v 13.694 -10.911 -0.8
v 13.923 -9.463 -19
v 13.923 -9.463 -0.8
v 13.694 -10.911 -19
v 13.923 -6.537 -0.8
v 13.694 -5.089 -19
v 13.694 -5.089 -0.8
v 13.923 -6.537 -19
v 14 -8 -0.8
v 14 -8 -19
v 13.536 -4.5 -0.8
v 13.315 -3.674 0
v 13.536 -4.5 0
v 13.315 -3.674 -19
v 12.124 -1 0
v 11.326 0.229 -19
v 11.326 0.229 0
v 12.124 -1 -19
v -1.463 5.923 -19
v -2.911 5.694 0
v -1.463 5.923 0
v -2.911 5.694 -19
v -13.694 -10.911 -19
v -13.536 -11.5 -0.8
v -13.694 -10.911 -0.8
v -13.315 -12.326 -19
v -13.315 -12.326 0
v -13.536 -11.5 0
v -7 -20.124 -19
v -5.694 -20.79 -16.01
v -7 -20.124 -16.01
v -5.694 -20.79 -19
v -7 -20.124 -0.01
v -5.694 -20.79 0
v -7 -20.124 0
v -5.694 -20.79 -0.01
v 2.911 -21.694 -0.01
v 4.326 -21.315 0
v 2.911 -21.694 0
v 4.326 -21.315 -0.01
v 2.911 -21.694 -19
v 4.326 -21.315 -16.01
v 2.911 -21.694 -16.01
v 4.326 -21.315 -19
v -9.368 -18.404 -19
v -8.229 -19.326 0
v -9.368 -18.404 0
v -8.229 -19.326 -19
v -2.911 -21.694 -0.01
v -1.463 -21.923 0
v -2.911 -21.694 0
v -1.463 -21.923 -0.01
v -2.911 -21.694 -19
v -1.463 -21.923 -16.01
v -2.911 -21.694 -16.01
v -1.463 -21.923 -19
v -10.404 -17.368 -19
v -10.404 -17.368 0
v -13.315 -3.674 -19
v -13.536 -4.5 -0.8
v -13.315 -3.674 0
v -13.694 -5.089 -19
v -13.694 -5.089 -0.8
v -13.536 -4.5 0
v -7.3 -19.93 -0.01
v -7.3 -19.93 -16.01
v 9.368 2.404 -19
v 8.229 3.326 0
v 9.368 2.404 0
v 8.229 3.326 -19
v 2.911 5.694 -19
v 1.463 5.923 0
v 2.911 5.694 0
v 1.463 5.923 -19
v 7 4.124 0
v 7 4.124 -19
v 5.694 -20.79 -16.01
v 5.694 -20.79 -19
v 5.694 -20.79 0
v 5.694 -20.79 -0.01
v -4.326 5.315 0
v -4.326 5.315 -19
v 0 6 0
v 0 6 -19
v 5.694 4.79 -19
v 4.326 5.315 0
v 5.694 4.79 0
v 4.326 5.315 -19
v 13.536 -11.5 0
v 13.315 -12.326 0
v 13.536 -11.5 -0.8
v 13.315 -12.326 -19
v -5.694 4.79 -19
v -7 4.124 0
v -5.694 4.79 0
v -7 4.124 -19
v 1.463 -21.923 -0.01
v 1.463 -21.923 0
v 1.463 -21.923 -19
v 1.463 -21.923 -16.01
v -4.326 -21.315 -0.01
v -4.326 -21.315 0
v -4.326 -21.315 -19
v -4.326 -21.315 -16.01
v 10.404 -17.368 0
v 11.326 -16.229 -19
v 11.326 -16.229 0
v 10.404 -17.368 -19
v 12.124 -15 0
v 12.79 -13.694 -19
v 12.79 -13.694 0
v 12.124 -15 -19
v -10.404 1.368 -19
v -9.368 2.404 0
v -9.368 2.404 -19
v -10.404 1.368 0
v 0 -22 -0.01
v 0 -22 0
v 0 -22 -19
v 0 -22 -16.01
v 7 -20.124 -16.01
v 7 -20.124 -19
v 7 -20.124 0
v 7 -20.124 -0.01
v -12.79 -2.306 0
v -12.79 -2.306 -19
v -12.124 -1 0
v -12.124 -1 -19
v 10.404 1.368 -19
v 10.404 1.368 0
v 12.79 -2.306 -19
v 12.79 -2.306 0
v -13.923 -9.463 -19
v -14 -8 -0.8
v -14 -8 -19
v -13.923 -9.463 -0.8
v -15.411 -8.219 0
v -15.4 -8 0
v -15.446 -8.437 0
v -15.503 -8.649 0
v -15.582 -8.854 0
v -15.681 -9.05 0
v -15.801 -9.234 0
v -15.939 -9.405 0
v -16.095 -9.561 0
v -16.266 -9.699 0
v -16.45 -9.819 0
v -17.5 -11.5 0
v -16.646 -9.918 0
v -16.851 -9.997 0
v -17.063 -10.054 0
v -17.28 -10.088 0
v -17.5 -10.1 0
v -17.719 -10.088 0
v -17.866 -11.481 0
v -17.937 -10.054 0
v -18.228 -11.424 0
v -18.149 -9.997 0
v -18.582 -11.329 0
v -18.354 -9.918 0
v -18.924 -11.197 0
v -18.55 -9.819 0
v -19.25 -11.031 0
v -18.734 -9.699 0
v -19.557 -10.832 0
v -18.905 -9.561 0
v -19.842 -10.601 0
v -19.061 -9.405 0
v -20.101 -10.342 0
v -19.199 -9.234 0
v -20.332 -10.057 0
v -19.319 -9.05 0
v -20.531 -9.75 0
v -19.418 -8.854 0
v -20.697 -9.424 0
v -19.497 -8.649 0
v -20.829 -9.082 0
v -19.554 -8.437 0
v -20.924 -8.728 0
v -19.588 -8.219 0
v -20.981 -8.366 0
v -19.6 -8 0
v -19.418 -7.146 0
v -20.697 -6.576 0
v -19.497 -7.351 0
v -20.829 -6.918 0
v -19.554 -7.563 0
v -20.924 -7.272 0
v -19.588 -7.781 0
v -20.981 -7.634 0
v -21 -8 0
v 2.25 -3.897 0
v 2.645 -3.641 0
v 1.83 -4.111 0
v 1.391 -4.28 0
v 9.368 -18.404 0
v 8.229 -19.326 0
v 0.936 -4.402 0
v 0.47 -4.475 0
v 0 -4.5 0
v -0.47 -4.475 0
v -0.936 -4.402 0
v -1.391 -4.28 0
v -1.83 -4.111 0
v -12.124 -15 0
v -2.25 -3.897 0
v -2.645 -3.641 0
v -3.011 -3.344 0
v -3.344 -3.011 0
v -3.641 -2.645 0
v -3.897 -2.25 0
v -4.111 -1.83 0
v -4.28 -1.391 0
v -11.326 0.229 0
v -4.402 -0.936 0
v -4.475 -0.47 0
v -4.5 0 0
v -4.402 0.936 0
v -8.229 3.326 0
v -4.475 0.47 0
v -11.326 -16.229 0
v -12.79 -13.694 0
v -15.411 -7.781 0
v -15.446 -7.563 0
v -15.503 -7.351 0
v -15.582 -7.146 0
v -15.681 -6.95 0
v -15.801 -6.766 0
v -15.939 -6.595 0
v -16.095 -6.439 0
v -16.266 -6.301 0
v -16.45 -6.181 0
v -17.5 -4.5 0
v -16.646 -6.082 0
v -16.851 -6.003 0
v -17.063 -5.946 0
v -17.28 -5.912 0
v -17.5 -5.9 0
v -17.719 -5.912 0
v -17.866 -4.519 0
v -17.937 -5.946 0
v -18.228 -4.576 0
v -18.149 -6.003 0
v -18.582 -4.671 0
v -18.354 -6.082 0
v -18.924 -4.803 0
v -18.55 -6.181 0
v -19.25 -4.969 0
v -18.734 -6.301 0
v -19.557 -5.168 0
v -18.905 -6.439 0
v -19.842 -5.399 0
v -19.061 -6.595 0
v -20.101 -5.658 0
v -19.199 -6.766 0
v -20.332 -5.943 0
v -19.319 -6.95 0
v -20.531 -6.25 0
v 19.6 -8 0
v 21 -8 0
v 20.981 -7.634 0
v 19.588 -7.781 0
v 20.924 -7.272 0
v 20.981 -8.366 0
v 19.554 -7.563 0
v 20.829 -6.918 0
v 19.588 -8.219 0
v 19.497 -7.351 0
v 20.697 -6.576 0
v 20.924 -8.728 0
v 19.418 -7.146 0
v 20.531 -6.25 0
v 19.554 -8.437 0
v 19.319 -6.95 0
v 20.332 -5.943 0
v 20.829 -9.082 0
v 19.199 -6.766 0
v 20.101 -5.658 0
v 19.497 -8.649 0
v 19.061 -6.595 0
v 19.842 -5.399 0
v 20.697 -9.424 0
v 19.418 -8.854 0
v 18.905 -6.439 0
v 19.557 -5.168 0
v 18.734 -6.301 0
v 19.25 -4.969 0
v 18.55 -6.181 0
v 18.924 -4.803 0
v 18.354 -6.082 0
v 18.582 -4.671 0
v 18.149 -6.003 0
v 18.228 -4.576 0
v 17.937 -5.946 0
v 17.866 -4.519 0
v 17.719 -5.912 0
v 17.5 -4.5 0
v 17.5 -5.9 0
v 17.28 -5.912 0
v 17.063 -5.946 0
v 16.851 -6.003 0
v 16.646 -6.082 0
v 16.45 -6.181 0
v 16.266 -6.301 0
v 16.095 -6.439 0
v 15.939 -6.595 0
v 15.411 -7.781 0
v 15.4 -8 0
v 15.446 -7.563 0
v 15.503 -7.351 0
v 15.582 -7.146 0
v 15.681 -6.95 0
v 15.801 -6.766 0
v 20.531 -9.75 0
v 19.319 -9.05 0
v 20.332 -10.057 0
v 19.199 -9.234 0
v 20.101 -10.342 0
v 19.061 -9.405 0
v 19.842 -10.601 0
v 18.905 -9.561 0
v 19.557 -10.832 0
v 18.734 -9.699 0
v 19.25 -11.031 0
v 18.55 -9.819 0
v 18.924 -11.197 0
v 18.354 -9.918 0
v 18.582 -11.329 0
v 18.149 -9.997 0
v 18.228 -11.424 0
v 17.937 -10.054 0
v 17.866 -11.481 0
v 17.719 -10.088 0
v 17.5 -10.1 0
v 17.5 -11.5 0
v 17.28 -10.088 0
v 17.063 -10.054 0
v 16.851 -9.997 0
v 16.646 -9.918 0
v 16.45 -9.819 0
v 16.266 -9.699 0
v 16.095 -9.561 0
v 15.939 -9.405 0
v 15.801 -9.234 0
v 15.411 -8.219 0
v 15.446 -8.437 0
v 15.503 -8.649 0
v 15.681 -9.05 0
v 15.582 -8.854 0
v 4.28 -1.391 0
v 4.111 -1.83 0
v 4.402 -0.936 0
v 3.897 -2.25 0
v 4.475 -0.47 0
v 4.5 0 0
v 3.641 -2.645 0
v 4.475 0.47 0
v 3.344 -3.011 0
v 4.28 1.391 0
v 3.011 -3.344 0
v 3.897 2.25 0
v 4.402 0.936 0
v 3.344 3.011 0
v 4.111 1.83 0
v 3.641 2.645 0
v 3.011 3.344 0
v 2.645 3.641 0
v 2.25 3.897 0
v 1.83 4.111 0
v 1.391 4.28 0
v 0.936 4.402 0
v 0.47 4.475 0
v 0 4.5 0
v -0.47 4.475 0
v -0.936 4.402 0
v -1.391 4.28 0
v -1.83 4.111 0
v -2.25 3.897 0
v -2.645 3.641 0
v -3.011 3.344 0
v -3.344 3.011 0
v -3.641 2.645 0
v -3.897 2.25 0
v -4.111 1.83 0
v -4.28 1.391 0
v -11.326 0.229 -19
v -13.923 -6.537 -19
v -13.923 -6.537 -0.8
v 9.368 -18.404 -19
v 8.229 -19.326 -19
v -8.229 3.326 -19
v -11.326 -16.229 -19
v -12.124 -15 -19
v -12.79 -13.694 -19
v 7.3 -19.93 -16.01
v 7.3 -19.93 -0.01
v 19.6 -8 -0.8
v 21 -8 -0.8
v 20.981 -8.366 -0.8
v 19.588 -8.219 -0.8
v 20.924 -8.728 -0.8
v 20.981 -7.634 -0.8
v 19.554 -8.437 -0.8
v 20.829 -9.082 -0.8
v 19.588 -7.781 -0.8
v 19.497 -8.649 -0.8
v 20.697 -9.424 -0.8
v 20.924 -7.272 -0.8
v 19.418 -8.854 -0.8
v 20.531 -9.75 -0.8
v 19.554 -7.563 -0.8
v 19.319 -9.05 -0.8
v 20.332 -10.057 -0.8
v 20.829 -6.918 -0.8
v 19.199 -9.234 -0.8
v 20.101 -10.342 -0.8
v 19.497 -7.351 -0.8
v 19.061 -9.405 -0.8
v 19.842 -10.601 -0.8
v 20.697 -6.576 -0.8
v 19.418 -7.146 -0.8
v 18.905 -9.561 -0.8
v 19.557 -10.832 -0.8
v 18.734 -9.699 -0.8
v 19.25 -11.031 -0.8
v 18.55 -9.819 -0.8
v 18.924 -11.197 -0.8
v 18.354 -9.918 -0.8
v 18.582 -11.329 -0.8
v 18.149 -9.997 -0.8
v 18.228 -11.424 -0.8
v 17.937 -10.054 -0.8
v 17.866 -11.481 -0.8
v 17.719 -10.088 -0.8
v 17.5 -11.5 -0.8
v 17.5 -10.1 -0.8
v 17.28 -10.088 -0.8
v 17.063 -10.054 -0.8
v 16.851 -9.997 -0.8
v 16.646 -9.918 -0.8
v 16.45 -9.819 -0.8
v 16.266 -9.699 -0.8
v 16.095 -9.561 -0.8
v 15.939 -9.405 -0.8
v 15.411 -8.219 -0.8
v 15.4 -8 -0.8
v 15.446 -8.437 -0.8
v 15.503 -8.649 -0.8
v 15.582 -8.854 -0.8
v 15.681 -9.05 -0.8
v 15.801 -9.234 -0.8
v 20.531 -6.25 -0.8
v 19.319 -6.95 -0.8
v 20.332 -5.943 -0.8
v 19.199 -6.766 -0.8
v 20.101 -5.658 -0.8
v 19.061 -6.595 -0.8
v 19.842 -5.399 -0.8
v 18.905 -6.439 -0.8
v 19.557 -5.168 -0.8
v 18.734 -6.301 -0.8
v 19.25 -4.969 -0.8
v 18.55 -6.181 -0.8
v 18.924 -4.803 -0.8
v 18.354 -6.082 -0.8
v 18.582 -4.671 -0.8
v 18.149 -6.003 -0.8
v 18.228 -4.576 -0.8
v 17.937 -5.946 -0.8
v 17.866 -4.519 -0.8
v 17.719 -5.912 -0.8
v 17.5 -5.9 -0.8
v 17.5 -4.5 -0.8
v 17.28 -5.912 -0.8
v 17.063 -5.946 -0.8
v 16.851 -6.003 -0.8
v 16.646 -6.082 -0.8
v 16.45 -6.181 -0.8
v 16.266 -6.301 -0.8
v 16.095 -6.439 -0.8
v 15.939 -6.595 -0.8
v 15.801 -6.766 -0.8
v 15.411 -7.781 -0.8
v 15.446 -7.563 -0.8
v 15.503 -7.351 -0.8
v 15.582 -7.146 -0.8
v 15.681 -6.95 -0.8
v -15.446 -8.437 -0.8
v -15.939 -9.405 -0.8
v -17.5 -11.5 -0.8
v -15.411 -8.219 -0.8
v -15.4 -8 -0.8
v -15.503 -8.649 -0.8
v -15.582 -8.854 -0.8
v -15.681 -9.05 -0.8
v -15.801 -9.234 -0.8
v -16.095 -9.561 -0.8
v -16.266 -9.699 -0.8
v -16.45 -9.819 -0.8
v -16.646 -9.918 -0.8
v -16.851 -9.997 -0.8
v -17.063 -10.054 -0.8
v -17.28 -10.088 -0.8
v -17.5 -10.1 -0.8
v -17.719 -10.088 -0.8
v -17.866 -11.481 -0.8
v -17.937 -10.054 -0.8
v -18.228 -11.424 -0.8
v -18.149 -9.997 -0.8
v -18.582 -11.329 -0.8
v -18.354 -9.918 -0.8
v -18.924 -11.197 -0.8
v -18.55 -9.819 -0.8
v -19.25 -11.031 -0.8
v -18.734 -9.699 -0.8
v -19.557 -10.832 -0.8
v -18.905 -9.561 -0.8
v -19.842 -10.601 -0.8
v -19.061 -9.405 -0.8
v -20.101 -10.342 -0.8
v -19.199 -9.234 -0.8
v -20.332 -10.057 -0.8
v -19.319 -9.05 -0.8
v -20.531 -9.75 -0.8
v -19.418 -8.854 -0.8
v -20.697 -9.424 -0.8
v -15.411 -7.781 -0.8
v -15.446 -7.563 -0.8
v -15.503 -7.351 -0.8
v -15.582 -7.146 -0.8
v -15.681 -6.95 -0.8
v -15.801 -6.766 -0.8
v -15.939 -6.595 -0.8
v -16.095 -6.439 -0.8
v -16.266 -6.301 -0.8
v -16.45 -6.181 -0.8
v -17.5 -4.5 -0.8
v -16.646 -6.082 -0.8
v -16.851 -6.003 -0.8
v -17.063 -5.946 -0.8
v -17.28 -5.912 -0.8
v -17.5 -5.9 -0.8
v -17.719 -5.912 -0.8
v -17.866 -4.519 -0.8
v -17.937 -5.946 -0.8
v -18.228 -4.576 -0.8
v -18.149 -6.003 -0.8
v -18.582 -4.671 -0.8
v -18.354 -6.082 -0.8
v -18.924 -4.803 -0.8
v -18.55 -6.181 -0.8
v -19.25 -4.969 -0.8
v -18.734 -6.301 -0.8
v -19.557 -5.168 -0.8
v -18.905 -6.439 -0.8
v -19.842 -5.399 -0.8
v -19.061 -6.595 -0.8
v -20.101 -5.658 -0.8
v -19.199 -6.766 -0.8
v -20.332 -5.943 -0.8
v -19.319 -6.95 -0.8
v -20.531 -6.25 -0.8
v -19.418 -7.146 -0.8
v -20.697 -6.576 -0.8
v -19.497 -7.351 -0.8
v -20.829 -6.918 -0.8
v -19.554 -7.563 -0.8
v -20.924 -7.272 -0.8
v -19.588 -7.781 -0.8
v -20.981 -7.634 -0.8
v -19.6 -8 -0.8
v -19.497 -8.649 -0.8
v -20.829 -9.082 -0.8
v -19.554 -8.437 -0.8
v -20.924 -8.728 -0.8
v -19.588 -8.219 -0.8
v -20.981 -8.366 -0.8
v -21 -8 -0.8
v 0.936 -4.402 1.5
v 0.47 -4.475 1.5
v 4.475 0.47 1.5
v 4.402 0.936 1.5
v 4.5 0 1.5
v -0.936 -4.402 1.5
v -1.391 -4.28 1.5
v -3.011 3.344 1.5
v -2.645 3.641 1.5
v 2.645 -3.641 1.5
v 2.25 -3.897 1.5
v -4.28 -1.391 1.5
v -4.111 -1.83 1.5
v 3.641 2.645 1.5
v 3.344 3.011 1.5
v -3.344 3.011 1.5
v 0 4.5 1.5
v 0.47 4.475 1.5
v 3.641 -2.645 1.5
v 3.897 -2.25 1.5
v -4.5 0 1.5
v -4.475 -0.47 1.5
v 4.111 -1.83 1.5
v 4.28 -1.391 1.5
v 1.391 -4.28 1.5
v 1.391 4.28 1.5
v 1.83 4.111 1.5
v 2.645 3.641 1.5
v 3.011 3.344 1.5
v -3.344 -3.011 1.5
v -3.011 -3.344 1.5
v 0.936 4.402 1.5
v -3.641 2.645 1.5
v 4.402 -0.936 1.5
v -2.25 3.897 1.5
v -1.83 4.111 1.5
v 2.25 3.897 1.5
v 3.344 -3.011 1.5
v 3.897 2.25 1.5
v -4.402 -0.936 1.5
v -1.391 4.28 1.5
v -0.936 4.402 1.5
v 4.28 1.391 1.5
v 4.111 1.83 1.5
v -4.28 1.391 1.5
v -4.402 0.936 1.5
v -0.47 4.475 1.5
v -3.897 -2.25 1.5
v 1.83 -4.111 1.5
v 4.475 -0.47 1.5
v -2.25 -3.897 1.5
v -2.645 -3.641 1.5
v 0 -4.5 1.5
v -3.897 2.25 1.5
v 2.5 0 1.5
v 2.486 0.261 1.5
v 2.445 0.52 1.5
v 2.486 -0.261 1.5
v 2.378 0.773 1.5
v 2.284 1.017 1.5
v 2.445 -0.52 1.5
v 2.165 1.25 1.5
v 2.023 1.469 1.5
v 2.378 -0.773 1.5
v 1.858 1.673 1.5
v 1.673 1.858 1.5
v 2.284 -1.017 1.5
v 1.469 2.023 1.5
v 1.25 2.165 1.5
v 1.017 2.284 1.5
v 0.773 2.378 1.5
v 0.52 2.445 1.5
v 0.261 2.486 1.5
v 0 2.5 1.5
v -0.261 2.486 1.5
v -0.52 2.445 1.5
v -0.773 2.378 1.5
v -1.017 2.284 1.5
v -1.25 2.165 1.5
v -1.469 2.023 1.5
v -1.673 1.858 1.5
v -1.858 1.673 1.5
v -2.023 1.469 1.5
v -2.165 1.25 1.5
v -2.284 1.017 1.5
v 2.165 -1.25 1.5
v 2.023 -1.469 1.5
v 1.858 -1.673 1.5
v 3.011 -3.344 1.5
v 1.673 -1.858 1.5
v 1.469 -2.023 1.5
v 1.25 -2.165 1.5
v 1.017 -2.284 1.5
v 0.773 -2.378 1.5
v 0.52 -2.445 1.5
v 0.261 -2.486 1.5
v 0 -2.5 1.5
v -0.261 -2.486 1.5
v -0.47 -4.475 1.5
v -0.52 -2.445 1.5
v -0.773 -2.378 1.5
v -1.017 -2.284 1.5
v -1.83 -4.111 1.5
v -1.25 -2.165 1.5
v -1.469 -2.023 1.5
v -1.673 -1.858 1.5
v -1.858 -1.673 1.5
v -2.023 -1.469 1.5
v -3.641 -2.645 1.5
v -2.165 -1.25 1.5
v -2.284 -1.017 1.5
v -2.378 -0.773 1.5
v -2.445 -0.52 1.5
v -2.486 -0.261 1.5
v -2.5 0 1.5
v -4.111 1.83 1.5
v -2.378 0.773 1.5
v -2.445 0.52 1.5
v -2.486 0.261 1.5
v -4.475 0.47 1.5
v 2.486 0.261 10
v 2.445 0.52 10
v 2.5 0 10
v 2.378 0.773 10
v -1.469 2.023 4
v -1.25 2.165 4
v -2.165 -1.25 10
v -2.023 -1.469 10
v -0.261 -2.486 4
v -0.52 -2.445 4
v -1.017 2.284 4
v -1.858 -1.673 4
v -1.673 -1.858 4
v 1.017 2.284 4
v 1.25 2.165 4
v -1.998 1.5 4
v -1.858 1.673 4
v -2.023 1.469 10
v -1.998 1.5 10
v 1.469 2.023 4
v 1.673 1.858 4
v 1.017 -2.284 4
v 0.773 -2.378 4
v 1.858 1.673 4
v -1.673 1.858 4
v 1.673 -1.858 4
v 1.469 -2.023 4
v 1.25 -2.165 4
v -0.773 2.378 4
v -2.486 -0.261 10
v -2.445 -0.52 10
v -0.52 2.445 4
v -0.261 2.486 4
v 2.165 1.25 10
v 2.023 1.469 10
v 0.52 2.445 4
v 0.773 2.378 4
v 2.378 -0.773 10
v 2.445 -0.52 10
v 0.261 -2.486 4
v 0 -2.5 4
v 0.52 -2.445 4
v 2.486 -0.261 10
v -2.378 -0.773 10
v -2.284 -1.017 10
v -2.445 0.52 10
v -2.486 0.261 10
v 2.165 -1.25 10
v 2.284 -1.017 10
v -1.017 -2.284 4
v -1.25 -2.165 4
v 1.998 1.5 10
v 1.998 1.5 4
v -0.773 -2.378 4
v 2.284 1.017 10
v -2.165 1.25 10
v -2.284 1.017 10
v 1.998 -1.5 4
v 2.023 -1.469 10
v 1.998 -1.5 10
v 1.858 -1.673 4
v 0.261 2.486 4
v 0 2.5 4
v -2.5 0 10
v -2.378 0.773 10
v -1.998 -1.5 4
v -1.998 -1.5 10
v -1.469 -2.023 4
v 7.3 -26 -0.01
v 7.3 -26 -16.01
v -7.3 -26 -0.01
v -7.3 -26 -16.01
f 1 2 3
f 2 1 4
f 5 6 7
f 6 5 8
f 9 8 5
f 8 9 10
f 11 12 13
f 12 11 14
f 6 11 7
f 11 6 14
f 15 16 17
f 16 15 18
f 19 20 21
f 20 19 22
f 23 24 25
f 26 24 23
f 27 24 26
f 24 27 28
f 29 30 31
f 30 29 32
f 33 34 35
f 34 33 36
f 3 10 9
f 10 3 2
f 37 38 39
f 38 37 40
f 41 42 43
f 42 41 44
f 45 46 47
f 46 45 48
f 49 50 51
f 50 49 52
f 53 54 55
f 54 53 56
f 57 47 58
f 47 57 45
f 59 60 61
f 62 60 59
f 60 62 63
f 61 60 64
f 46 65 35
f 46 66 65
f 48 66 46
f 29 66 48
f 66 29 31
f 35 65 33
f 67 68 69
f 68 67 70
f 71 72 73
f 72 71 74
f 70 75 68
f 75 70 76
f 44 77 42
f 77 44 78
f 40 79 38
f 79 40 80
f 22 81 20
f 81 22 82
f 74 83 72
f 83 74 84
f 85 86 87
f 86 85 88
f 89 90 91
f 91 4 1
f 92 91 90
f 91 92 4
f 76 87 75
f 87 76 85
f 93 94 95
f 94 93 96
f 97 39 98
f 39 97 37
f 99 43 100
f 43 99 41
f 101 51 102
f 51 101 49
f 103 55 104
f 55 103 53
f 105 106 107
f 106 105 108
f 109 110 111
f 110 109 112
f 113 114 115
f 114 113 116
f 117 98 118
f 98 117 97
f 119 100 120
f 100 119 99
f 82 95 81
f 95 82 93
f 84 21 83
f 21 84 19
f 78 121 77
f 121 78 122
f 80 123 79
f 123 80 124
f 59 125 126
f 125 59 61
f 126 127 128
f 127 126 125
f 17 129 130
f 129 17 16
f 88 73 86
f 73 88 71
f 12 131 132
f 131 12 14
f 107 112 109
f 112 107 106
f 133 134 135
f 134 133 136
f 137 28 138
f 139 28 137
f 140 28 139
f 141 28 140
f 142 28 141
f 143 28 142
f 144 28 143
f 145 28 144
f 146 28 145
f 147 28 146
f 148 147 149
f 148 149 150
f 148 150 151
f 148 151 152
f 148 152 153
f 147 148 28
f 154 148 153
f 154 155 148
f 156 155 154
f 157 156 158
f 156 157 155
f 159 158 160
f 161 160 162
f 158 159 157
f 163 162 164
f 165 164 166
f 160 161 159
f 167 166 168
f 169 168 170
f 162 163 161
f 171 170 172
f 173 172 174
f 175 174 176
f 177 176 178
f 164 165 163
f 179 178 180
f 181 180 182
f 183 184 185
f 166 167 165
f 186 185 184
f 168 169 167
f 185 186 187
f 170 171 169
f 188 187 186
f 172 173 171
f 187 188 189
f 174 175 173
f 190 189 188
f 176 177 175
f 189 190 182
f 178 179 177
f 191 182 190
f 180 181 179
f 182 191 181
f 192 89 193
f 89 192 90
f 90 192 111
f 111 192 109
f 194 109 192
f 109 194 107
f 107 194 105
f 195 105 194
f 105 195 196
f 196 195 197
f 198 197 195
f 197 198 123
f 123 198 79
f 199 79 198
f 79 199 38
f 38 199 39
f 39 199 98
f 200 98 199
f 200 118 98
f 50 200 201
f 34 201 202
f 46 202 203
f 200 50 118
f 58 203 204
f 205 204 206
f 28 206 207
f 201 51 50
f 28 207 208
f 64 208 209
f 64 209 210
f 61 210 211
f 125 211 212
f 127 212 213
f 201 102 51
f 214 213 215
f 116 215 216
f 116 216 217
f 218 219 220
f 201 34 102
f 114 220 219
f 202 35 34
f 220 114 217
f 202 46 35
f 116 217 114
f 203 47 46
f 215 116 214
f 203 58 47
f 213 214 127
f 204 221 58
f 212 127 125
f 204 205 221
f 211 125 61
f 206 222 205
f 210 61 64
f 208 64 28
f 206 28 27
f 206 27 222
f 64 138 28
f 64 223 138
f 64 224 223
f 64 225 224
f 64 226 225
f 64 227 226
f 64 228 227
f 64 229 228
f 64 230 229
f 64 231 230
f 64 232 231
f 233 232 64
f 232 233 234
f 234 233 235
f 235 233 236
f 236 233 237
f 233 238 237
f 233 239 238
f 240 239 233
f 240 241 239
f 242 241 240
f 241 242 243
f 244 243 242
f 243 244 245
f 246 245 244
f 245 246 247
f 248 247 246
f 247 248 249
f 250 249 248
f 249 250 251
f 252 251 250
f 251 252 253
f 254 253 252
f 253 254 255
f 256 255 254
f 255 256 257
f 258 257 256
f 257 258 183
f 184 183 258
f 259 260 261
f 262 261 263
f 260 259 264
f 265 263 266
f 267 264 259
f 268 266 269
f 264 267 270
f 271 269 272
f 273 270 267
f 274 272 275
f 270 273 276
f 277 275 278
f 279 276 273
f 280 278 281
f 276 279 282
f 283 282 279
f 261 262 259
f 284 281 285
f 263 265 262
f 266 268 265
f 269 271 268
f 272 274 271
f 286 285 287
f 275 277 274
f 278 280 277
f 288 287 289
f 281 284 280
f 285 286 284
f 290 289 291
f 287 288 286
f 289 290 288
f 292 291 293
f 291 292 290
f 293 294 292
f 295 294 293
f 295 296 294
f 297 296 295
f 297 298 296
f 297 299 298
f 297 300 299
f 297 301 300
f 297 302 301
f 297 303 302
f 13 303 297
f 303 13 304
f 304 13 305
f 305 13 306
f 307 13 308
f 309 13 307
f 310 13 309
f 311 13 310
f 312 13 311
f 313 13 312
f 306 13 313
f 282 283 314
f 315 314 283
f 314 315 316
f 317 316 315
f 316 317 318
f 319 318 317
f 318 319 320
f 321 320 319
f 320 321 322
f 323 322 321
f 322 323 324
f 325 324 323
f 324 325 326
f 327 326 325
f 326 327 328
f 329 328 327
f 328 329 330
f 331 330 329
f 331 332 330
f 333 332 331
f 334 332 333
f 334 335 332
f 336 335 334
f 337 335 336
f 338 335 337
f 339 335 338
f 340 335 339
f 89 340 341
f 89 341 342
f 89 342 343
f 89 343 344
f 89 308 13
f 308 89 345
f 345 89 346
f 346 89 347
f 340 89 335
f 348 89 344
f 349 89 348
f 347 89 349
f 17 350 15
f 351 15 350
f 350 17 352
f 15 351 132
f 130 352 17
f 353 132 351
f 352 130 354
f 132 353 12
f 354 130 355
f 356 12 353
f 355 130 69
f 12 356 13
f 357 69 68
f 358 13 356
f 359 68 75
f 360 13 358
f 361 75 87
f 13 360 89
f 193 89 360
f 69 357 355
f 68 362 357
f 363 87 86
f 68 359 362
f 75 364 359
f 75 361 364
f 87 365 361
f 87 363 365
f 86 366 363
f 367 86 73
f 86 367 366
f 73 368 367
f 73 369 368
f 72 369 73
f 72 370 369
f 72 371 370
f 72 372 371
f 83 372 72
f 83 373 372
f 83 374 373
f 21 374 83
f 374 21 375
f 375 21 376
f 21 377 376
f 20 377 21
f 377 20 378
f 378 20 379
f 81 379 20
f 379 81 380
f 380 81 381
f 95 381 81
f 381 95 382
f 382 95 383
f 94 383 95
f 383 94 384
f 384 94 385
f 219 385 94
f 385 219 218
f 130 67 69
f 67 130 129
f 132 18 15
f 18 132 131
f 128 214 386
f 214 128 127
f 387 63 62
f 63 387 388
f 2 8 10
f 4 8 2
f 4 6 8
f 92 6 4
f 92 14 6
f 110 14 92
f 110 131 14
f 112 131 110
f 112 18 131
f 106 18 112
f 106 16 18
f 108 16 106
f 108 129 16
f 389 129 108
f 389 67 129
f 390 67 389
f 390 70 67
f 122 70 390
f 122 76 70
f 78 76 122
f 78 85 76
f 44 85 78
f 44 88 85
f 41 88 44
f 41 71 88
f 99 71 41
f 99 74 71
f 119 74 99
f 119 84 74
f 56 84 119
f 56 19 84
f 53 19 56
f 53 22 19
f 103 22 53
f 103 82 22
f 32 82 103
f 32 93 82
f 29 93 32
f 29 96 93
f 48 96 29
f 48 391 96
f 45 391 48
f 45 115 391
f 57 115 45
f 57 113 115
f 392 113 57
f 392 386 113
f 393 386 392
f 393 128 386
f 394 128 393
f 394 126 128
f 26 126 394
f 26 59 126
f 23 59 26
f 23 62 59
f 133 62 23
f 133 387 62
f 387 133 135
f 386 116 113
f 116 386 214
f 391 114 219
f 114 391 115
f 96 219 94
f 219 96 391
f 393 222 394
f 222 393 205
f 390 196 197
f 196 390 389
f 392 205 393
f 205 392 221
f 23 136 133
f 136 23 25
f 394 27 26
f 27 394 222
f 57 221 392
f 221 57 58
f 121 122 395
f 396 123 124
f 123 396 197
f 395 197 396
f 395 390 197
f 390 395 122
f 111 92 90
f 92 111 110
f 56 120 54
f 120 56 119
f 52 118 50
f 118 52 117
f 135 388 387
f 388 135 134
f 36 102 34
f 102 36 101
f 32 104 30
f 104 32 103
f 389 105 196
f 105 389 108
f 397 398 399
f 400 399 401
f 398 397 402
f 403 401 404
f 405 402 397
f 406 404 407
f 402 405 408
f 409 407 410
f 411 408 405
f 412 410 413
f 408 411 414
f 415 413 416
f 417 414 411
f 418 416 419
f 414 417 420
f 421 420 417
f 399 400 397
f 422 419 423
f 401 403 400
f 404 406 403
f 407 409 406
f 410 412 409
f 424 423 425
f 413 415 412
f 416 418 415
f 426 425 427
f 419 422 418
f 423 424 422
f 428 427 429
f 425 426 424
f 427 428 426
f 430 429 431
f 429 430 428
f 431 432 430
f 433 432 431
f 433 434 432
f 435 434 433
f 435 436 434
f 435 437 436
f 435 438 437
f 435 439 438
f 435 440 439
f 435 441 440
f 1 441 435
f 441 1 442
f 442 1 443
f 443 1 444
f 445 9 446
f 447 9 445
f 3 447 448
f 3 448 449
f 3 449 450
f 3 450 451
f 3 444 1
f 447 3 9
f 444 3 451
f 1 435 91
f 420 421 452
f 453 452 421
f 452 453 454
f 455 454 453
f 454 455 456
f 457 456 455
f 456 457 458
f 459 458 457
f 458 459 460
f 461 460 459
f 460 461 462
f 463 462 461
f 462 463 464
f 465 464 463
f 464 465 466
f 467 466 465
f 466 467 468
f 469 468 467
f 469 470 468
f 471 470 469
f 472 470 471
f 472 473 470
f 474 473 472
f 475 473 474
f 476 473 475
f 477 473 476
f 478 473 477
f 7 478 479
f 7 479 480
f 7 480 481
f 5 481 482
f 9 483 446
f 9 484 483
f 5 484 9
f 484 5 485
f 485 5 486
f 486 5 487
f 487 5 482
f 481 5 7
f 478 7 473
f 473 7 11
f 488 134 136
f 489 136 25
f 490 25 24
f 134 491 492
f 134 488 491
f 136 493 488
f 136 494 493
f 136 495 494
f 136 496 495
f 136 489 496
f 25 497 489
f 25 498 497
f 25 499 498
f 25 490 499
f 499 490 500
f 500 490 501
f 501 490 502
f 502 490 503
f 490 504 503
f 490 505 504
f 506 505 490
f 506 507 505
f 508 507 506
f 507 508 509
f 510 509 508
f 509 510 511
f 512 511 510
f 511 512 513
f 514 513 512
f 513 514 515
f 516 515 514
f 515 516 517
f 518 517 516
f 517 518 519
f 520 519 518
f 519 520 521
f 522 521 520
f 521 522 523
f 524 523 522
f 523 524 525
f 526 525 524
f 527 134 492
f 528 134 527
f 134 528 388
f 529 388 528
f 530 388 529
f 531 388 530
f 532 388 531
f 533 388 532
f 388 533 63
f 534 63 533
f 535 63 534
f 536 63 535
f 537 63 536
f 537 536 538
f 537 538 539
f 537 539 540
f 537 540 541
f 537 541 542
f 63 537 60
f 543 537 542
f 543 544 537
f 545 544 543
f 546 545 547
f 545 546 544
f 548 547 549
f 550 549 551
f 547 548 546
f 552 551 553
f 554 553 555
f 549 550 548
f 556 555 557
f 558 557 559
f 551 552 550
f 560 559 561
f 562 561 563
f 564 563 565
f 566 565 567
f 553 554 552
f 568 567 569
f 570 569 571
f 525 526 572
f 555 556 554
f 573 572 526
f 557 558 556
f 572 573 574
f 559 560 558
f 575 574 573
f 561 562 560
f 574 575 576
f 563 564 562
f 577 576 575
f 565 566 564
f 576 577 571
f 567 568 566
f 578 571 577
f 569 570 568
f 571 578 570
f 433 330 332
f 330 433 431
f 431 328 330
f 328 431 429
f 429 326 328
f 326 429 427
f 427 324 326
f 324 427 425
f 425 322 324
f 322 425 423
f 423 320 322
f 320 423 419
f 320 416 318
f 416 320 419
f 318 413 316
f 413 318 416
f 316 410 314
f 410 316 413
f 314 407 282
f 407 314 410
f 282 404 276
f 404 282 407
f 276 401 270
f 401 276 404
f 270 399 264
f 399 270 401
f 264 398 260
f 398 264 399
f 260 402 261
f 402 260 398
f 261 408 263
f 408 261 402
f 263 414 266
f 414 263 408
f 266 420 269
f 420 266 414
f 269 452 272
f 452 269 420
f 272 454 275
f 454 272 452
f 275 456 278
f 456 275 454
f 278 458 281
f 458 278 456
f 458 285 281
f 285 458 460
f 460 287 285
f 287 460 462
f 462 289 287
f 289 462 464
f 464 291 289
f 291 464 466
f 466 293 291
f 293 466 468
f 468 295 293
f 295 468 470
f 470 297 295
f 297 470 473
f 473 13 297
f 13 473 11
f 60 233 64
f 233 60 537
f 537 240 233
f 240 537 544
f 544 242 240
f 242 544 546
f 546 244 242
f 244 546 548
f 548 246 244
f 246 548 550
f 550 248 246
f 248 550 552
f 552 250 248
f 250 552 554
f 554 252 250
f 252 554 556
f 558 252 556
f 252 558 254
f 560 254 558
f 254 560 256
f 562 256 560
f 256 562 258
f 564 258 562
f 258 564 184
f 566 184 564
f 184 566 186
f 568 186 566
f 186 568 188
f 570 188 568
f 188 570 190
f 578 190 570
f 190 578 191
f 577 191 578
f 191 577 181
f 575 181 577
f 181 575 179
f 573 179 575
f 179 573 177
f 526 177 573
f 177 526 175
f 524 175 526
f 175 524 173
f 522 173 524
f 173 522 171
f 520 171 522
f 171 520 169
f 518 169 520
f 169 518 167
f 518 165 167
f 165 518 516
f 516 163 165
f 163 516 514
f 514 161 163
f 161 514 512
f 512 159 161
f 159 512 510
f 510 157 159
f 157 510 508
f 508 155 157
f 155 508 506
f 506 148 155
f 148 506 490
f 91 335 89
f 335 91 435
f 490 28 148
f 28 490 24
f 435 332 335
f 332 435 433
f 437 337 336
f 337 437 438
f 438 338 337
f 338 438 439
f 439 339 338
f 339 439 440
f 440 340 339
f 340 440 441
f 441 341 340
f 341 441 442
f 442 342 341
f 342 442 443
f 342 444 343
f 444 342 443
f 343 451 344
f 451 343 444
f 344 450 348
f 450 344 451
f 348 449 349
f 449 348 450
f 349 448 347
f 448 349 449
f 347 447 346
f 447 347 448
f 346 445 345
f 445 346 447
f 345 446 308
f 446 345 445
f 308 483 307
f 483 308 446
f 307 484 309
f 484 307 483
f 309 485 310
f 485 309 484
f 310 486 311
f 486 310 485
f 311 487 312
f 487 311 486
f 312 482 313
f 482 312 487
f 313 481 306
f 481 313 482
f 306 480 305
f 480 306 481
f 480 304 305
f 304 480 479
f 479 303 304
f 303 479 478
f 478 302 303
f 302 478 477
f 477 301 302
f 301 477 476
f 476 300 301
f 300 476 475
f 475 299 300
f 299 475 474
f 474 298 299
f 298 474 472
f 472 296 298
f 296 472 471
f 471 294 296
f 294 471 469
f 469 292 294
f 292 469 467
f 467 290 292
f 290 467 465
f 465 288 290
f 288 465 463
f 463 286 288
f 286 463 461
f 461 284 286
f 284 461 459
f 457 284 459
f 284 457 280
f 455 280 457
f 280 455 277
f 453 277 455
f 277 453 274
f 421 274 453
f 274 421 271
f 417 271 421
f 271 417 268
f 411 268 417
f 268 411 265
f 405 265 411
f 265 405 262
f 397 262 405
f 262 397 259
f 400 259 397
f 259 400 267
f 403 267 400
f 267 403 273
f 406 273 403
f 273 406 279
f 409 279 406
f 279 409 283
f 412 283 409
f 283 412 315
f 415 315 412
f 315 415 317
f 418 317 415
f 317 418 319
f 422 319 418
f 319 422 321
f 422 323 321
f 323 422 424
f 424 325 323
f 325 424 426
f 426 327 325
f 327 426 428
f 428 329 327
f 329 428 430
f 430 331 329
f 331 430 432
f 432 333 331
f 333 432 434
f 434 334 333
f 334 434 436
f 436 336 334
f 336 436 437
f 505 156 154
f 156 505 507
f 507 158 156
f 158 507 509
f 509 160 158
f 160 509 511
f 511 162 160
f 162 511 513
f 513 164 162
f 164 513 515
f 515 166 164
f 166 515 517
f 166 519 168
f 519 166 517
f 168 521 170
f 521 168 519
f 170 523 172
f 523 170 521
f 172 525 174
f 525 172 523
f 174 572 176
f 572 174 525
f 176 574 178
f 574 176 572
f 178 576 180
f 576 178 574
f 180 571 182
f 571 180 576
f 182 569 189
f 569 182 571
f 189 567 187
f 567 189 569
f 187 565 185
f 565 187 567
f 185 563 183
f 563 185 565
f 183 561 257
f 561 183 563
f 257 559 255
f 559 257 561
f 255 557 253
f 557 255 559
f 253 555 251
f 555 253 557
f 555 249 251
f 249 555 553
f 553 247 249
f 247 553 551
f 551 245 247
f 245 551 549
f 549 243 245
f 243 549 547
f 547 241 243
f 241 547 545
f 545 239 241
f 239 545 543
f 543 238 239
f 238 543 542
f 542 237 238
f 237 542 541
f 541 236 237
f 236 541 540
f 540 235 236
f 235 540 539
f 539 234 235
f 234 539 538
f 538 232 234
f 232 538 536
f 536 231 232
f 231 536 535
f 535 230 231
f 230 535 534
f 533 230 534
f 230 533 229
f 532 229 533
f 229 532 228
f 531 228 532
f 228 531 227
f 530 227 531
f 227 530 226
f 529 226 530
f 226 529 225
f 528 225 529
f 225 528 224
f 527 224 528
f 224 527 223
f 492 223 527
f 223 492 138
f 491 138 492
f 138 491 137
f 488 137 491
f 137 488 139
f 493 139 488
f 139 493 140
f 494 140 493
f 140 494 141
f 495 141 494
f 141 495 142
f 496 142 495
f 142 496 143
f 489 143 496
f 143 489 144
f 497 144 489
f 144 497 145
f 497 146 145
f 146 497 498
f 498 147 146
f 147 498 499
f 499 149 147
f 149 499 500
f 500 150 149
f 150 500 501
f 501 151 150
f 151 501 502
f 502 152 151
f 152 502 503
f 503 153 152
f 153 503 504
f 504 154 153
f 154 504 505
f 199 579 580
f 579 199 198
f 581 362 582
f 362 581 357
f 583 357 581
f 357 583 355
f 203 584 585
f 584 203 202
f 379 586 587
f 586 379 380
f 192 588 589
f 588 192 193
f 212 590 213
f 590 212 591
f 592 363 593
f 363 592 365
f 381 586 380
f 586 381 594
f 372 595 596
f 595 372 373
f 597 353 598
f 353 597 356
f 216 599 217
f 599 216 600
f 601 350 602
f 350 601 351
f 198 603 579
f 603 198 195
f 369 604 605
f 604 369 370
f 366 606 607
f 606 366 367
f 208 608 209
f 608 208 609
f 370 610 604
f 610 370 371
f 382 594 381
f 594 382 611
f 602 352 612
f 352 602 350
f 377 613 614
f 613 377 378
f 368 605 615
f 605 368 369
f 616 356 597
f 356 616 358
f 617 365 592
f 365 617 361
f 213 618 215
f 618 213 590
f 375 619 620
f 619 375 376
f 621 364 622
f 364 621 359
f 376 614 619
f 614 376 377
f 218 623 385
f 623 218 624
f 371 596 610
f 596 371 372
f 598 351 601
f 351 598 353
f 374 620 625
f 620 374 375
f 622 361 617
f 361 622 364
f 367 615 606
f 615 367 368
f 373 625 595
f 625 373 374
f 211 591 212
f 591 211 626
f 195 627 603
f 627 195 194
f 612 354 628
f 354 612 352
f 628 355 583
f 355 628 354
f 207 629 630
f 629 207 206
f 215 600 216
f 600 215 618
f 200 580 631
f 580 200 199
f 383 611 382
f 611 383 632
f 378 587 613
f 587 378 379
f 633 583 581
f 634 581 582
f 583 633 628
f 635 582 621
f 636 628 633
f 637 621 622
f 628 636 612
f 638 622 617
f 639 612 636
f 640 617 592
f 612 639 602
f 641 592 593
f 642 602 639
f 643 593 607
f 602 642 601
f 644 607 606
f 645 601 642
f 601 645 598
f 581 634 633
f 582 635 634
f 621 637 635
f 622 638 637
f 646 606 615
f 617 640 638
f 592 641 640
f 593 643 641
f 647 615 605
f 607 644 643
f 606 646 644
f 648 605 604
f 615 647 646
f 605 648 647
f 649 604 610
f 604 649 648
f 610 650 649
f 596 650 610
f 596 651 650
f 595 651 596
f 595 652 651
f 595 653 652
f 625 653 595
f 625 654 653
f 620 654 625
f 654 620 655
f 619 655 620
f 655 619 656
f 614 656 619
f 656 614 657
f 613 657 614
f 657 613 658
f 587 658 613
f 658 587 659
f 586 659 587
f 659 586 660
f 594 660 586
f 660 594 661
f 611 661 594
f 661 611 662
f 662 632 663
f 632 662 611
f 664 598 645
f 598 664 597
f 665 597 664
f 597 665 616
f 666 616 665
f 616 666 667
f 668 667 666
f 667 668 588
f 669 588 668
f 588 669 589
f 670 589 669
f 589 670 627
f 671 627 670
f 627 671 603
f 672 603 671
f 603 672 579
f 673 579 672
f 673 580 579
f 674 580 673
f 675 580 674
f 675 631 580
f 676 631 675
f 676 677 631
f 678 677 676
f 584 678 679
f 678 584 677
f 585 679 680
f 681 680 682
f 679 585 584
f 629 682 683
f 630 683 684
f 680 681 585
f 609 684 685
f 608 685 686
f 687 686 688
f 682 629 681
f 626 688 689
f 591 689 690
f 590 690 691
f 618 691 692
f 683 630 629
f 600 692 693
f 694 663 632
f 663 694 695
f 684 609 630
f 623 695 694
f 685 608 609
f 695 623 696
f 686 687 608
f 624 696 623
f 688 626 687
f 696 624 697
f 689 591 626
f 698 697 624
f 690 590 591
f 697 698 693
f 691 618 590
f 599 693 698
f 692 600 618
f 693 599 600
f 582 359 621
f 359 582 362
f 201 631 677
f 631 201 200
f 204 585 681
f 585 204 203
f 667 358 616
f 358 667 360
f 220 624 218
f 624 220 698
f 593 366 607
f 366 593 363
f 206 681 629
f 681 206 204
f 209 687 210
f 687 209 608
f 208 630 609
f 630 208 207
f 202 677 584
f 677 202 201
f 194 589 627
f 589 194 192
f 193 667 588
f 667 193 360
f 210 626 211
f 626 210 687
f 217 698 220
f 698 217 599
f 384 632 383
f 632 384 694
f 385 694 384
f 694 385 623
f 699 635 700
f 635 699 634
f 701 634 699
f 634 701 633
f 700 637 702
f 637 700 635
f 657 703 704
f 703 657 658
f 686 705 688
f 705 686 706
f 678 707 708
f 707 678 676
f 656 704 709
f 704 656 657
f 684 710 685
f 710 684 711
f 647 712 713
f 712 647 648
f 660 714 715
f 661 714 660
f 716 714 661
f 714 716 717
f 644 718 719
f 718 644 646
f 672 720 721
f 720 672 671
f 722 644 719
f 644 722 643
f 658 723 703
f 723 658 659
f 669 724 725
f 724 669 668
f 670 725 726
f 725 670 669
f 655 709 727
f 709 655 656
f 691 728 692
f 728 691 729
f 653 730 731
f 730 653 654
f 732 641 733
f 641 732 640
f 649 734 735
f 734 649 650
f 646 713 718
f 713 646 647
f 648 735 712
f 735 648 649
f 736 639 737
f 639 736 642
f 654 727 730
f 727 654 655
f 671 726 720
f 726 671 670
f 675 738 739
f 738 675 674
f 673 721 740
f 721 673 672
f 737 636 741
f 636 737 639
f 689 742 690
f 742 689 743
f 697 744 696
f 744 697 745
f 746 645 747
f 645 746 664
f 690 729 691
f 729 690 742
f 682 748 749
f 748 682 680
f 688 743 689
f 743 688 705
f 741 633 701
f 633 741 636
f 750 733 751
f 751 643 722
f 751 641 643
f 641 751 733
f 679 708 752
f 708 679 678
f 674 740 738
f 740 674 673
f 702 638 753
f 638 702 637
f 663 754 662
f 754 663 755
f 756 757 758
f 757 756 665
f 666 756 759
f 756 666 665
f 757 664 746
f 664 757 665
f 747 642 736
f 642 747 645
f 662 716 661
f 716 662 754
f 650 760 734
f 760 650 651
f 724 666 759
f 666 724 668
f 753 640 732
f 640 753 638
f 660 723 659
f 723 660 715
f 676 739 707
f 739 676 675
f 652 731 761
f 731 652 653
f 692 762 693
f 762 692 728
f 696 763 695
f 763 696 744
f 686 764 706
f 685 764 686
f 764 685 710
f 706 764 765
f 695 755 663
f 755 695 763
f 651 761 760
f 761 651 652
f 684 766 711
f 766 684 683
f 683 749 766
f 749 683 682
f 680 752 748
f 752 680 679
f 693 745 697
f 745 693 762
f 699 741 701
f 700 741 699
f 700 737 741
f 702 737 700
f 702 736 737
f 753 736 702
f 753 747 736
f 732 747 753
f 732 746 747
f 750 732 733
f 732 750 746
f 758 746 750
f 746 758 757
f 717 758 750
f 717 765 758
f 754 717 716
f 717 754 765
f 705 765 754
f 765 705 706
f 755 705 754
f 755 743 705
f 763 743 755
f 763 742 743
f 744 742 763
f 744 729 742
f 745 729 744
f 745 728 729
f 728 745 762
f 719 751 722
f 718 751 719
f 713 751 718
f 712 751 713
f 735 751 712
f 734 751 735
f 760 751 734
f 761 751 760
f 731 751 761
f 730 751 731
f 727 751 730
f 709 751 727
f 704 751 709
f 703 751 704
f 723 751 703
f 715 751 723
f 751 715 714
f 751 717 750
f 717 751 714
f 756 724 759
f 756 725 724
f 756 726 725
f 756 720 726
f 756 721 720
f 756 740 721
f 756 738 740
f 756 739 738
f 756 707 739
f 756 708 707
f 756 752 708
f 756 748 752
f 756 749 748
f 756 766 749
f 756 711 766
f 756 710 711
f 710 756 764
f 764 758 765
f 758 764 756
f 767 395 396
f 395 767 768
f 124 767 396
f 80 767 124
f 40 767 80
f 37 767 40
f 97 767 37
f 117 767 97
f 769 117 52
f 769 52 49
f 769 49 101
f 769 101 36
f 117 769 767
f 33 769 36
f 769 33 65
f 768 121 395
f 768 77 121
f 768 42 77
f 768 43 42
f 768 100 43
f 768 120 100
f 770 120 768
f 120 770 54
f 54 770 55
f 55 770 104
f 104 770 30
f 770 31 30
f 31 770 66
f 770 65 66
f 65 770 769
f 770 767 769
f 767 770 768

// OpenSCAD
// file: ../28byj-48.scad
/*
   Copyright 2015 Scott Bezek

   Licensed under the Apache License, Version 2.0 (the "License");
   you may not use this file except in compliance with the License.
   You may obtain a copy of the License at

       http://www.apache.org/licenses/LICENSE-2.0

   Unless required by applicable law or agreed to in writing, software
   distributed under the License is distributed on an "AS IS" BASIS,
   WITHOUT WARRANTIES OR CONDITIONS OF ANY KIND, either express or implied.
   See the License for the specific language governing permissions and
   limitations under the License.
*/

// Basic 28BYJ-48 model based on various dimensioned drawings.
// Origin is centered on the shaft, on the front face of the motor, with the shaft in the +z direction
module Stepper28BYJ48() {
    $fn = 60;

    eps = 0.01;
    chassis_radius = 28/2;
    chassis_height = 19;
    shaft_offset = 8;
    mount_outer_radius = 3.5;
    mount_hole_radius = 4.2/2;
    mount_center_offset = 35/2;
    mount_bracket_height = 0.8;

    shaft_collar_radius = 9/2;
    shaft_collar_height = 1.5;

    shaft_radius = 5/2;
    shaft_height = 10;
    shaft_slotted_width = 3;
    shaft_slotted_height = 6;

    backpack_width = 14.6;
    backpack_extent = 18; // seen values from 17-18
    backpack_height = 16;

    gray = [0.7, 0.7, 0.7];
    gold = "gold";
    blue = "blue";

    module mounting_holes() {
        linear_extrude(height=mount_bracket_height) {
        difference() {
            hull() {
                translate([mount_center_offset, 0]) {
                    circle(r=mount_outer_radius);
                }
                translate([-mount_center_offset, 0]) {
                    circle(r=mount_outer_radius);
                }
            }

            translate([mount_center_offset, 0]) {
                circle(r=mount_hole_radius);
            }
            translate([-mount_center_offset, 0]) {
                circle(r=mount_hole_radius);
            }
        }
        }
    }

    module shaft_collar() {
        cylinder(r=shaft_collar_radius, h=shaft_collar_height + eps);
    }

    module shaft() {
        color(gold) {
            difference() {
                cylinder(r=shaft_radius, h=shaft_height);
                translate([-(shaft_radius + eps), shaft_slotted_width / 2, shaft_height - shaft_slotted_height]) {
                    cube([(shaft_radius+eps)*2, shaft_radius, shaft_slotted_height+eps]);
                }
                translate([-(shaft_radius + eps), - shaft_radius - (shaft_slotted_width / 2), shaft_height - shaft_slotted_height]) {
                    cube([(shaft_radius+eps)*2, shaft_radius, shaft_slotted_height+eps]);
                }
            }
        }
    }

    module chassis() {
        color(gray) {
            translate([0, 0, -chassis_height]) {
                cylinder(r=chassis_radius, h=chassis_height);
            }
            translate([0, 0, -mount_bracket_height]) {
                mounting_holes();
            }
            translate([0, shaft_offset, -eps]) {
                shaft_collar();
            }
        }
    }

    module backpack() {
        color(blue) {
            translate([-backpack_width/2, 0, -backpack_height - eps]) {
                cube([backpack_width, backpack_extent, backpack_height]);
            }
        }
    }

    translate([0, -shaft_offset, 0]) {
        chassis();
        translate([0, shaft_offset, 0]) {
            shaft();
        }
        translate([0, -backpack_extent, 0]) {
            backpack();
        }
    }
}

Stepper28BYJ48();
// file: ../m4_dimensions.scad
/*
   Copyright 2015-2018 Scott Bezek and the splitflap contributors

   Licensed under the Apache License, Version 2.0 (the "License");
   you may not use this file except in compliance with the License.
   You may obtain a copy of the License at

       http://www.apache.org/licenses/LICENSE-2.0

   Unless required by applicable law or agreed to in writing, software
   distributed under the License is distributed on an "AS IS" BASIS,
   WITHOUT WARRANTIES OR CONDITIONS OF ANY KIND, either express or implied.
   See the License for the specific language governing permissions and
   limitations under the License.
*/
// file: ../common.scad
// MDF, .120in nominal
// https://www.ponoko.com/materials/mdf-fiberboard
thickness = 3.0;

etch_depth = 0.1;  // for render
eps=.01;
num_flaps = 40;

// Rendering Colors
assembly_color = [0.76, 0.60, 0.42];  // MDF, "c1996b"
etch_color = [0, 0, 0];  // black, "000000"


assembly_color1 = color_multiply(assembly_color, [1.161, 1.157, 1.157, 1.0]);  // "e1b17c" with MDF
assembly_color2 = color_multiply(assembly_color, [0.897, 0.895, 0.895, 1.0]);  // "ae8960" with MDF
assembly_color3 = color_multiply(assembly_color, [0.547, 0.542, 0.540, 1.0]);  // "6a533a" with MDF
assembly_color4 = color_multiply(assembly_color, [0.268, 0.268, 0.271, 1.0]);  // "34291d" with MDF

// multiply two equal matricies by each element, limiting to a max of 1.0
function color_multiply(x, y) =
    [ for(j=[0:len(x) - 1]) min(x[j] * y[j], 1.0) ];

// inverts a color matrix by subtracting the input channel values from 1.0
function color_invert(x) =
    [ for(j=[0:len(x) - 1]) (1.0 - x[j]) ];

module enclosure_etch_style() {
    color(etch_color)
        translate([0, 0, thickness])
            linear_extrude(height=etch_depth)
                children();
}
// file: motor.scad
/*
   Copyright 2015-2016 Scott Bezek and the splitflap contributors

   Licensed under the Apache License, Version 2.0 (the "License");
   you may not use this file except in compliance with the License.
   You may obtain a copy of the License at

       http://www.apache.org/licenses/LICENSE-2.0

   Unless required by applicable law or agreed to in writing, software
   distributed under the License is distributed on an "AS IS" BASIS,
   WITHOUT WARRANTIES OR CONDITIONS OF ANY KIND, either express or implied.
   See the License for the specific language governing permissions and
   limitations under the License.
*/

include<../28byj-48.scad>;

motor_shaft_under_radius = 0.08;  // interference fit
motor_slop_radius = 3;

// holes for 28byj-48 motor, centered around motor shaft
module motor_mount() {
    circle(r=28byj48_shaft_radius+motor_slop_radius, $fn=30);
    translate([-28byj48_mount_center_offset, -8]) {
        circle(r=motor_mount_hole_radius, $fn=30);
    }
    translate([28byj48_mount_center_offset, -8]) {
        circle(r=motor_mount_hole_radius, $fn=30);
    }

    hull() {
        x = -28byj48_chassis_radius - motor_hole_slop/2 + motor_window_radius;
        y = [-28byj48_shaft_offset - motor_backpack_extent - motor_hole_slop/2 + motor_window_radius,
            -28byj48_shaft_offset + 28byj48_chassis_radius + motor_hole_slop/2 - motor_window_radius];

        translate([ x, y[0], 0]) circle(r=motor_window_radius, $fn=40);
        translate([-x, y[1], 0]) circle(r=motor_window_radius, $fn=40);
        translate([-x, y[0], 0]) circle(r=motor_window_radius, $fn=40);
        translate([ x, y[1], 0]) circle(r=motor_window_radius, $fn=40);
    }
}

// double-flatted motor shaft of 28byj-48 motor (2D)
module motor_shaft() {
    union() {
        intersection() {
            circle(r=28byj48_shaft_radius-motor_shaft_under_radius, $fn=50);
            square([28byj48_shaft_radius*2, 3], center=true);
        }
        square([28byj48_shaft_radius/3, 28byj48_shaft_radius*4], center=true);
    }
}
// file: flap.scad
/*
   Copyright 2018 Scott Bezek and the splitflap contributors

   Licensed under the Apache License, Version 2.0 (the "License");
   you may not use this file except in compliance with the License.
   You may obtain a copy of the License at

       http://www.apache.org/licenses/LICENSE-2.0

   Unless required by applicable law or agreed to in writing, software
   distributed under the License is distributed on an "AS IS" BASIS,
   WITHOUT WARRANTIES OR CONDITIONS OF ANY KIND, either express or implied.
   See the License for the specific language governing permissions and
   limitations under the License.
*/

flap_width = 54;
flap_height = 43;
flap_thickness = 30 / 1000 * 25.4; // 30 mil
flap_corner_radius = 3.1; // 2.88-3.48mm (used just for display)
flap_width_slop = 0.5;  // amount of slop of the flap side to side between the 2 spools

flap_notch_height_auto = false;
flap_notch_height_default = 15;
flap_notch_depth = 3.2;

flap_notch_height = (flap_notch_height_auto == true) ? sqrt(spool_outer_radius*spool_outer_radius - flap_pitch_radius*flap_pitch_radius) : flap_notch_height_default;

flap_pin_width = 1.4;
flap_color = [1, 1, 1];  // white, "ffffff"

eps=.01;

flap_hole_radius = (flap_pin_width + 1) / 2;
flap_hole_separation = 1;  // additional spacing between hole edges
flap_gap = (flap_hole_radius * 2 - flap_pin_width) + flap_hole_separation;

// flap();

module flap_2d(cut_tabs = true) {
    translate([0, -flap_pin_width/2, 0])
    difference() {
        union() {
            square([flap_width, flap_height - flap_corner_radius]);

            // rounded corners
            hull() {
                translate([flap_corner_radius, flap_height - flap_corner_radius])
                    circle(r=flap_corner_radius, $fn=40);
                translate([flap_width - flap_corner_radius, flap_height - flap_corner_radius])
                    circle(r=flap_corner_radius, $fn=40);
            }
        }
        // spool tabs
        if(cut_tabs) {
            translate([-eps, flap_pin_width])
                square([eps + flap_notch_depth, flap_notch_height]);
            translate([flap_width - flap_notch_depth, flap_pin_width])
                square([eps + flap_notch_depth, flap_notch_height]);
        }
    }
}

module flap() {
    color(flap_color)
    translate([0, 0, -flap_thickness/2])
    linear_extrude(height=flap_thickness) {
        flap_2d();
    }
}

module draw_letter(letter) {
    translate([0, -flap_height * letter_height, 0])  // valign compensation
        scale([letter_width, 1, 1])
            translate([letter_offset_x, letter_offset_y])
                text(text=letter, size=flap_height * letter_height * 2, font=letter_font, halign="center");
}

module flap_letter(letter, half = 0) {
    color(letter_color)
    translate([0, 0, flap_thickness/2 + eps])
    linear_extrude(height=0.1, center=true) {
        if (half != 0) {  // trimming to top (1) or bottom (2)
            intersection() {
                flap_2d();  // limit to bounds of flap
                translate([flap_width/2, -flap_pin_width/2, 0]) {
                    rotation = (half == 2) ? -180 : 0;  // flip upside-down for bottom
                    gap_comp = (letter_gap_comp == true) ? -flap_gap/2 : 0;
                    translate([0, gap_comp, 0])
                        rotate([0,0,rotation])
                            draw_letter(letter);
                }
            }
        } else {
            translate([flap_width/2, -flap_pin_width/2 - flap_gap/2, 0])
                draw_letter(letter);
        }
    }
}
// main file
/*
   Copyright 2015-2016 Scott Bezek and the splitflap contributors

   Licensed under the Apache License, Version 2.0 (the "License");
   you may not use this file except in compliance with the License.
   You may obtain a copy of the License at

       http://www.apache.org/licenses/LICENSE-2.0

   Unless required by applicable law or agreed to in writing, software
   distributed under the License is distributed on an "AS IS" BASIS,
   WITHOUT WARRANTIES OR CONDITIONS OF ANY KIND, either express or implied.
   See the License for the specific language governing permissions and
   limitations under the License.
*/

include<flap.scad>;
include<motor.scad>;
include<../common.scad>;
include<../m4_dimensions.scad>;

thickness = 3.0;

spool_strut_num_joints = 3;
spool_strut_tab_width=8;
spool_strut_tab_width_narrow=6;
spool_strut_tab_outset=8;

spool_width_slop = 1.4;  // amount of slop for the spool assembly side-to-side inside the enclosure
spool_width = flap_width - flap_notch_depth*2 + flap_width_slop + thickness*2;  // spool width, outside face (spool to spool)
spool_width_clearance = max(spool_width, flap_width + flap_width_slop);  // width clearance for the spool, either for the spool itself or the flaps

spool_strut_width = (spool_strut_tab_outset + thickness/2) * 2;
spool_strut_length = spool_width;
spool_strut_inner_length = spool_width - 3 * thickness;


spool_tab_clearance = -0.06;  // for the tabs connecting the struts to the spool ends (interference fit)
spool_retaining_clearance = 0.10;  // for the notches in the spool retaining wall
spool_joint_clearance = 0.10;  // for the notched joints on the spool struts

spool_strut_exclusion_radius = sqrt((spool_strut_tab_outset+thickness/2)*(spool_strut_tab_outset+thickness/2) + (spool_strut_tab_width/2)*(spool_strut_tab_width/2));
flap_pitch_radius = flap_spool_pitch_radius(num_flaps, flap_hole_radius, flap_hole_separation); //num_flaps * (flap_hole_radius*2 + flap_hole_separation) / (2*PI);
echo(spool_strut_exclusion_radius );
echo(flap_pitch_radius );
echo((spool_strut_exclusion_radius + flap_pitch_radius)/2);
magnet_diameter = 4;
magnet_hole_clearance = -0.07;  // interference fit
magnet_hole_radius = (magnet_diameter + magnet_hole_clearance)/2;

magnet_hole_offset = (spool_strut_exclusion_radius + flap_pitch_radius)/2;



spool_explosion = 0; // 0-1
spool_strut_explosion = lookup(spool_explosion, [
    [0, 0],
    [0.2, 0],
    [1, 30],
]);
spool_horizontal_explosion = lookup(spool_explosion, [
    [0, 0],
    [1, 8],
]);
flap_spool_outset = flap_hole_radius;


module spool_strut() {
    joint_tab_width = spool_strut_inner_length / spool_strut_num_joints;
    linear_extrude(thickness, center=true) {
        union() {
            translate([0, -spool_strut_tab_width_narrow / 2]) {
                square([thickness + eps, spool_strut_tab_width_narrow]);
            }
            translate([thickness, -spool_strut_tab_width / 2]) {
                square([spool_strut_length - thickness, spool_strut_tab_width]);
            }
            translate([thickness*2, -spool_strut_width / 2]) {
                difference() {
                    square([spool_strut_inner_length, spool_strut_width]);

                    // subtract out joints
                    union() {
                        for (i = [0:2:spool_strut_num_joints-1]) {
                            translate([i*joint_tab_width - spool_joint_clearance/2, -eps])
                                square([joint_tab_width + spool_joint_clearance, thickness + spool_joint_clearance/2 + eps]);
                        }
                        for (i = [1:2:spool_strut_num_joints-1]) {
                            translate([i*joint_tab_width, spool_strut_width - thickness - spool_joint_clearance/2])
                                square([joint_tab_width, thickness + spool_joint_clearance + eps]);
                        }
                    }
                }
            }
        }
    }
}

module spool_struts() {
    for (i=[0:3]) {
        angle = 90*i;
        //color([i < 2 ? 0 : 1, i == 0 || i == 2 ? 0 : 1, 0])
        color(i % 2 == 0 ? assembly_color2 : assembly_color3)
        translate([0, sin(angle)*(spool_strut_tab_outset + spool_strut_explosion), cos(angle)*(spool_strut_tab_outset + spool_strut_explosion)])
            rotate([-angle, 0, 0])
                spool_strut();
    }
}

// ##### Struts for bracing spool #####
module spool_strut_tab_hole(narrow, clearance) {
    square([thickness + clearance, narrow ? spool_strut_tab_width_narrow + clearance : spool_strut_tab_width + clearance], center=true);
}
module spool_strut_tab_holes(narrow=false, clearance=spool_tab_clearance) {
    for (i=[0:3]) {
        angle = 90*i;
        translate([cos(angle)*spool_strut_tab_outset, sin(angle)*spool_strut_tab_outset])
            rotate([0,0,angle])
                spool_strut_tab_hole(narrow, clearance);
    }
}

module flap_spool_complete(captive_nut=false, motor_shaft=false, magnet_hole=false) {
    linear_extrude(thickness, convexity=10) {  // 'convexity' to fix rendering errors with etch 'difference()' result
        difference() {
            flap_spool(num_flaps, flap_hole_radius, flap_hole_separation, flap_spool_outset,
                    height=0);

            spool_strut_tab_holes(narrow=captive_nut);
            if (captive_nut) {
                circle(r=m4_nut_width_corners_padded/2, $fn=6);
            }
            if (motor_shaft) {
                rotate([0, 0, 90]) {
                    motor_shaft();
                }
            }
            if (magnet_hole) {
                // Hole for press fit magnet
                translate([magnet_hole_offset, 0]) {
                    circle(r=magnet_hole_radius, $fn=15);
                }
            }
        }
    }
}

module flap_spool_etch() {
    enclosure_etch_style()
        flap_spool_home_indicator(num_flaps, flap_hole_radius, flap_hole_separation, flap_spool_outset);
}



module flap_spool(flaps, flap_hole_radius, flap_hole_separation, outset, height) {
    pitch_radius = flap_spool_pitch_radius(flaps, flap_hole_radius, flap_hole_separation);
    outer_radius = flap_spool_outer_radius(flaps, flap_hole_radius, flap_hole_separation, outset);


    module flap_spool_2d() {
        difference() {
            circle(r=outer_radius, $fn=60);
            for (i = [0 : flaps - 1]) {
                translate([cos(360/flaps*i)*pitch_radius, sin(360/flaps*i)*pitch_radius]) circle(r=flap_hole_radius, $fn=15);
            }
        }
    }

    if (height > 0) {
        linear_extrude(height) {
            flap_spool_2d();
        }
    } else {
        flap_spool_2d();
    }
}

module flap_spool_home_indicator(flaps, flap_hole_radius, flap_hole_separation, outset, height=0) {
    pitch_radius = flap_spool_pitch_radius(flaps, flap_hole_radius, flap_hole_separation);
    outer_radius = flap_spool_outer_radius(flaps, flap_hole_radius, flap_hole_separation, outset);

    module flap_spool_home_indicator_2d() {
        angle = (360 / flaps) * round(0.25 * flaps);  // always point directly to a flap hole

        translate([cos(angle) * pitch_radius, sin(angle) * pitch_radius])
        rotate([0, 0, angle])
        translate([-flap_hole_radius * 2, 0])
        hull() {
            circle(r=flap_hole_radius/2, $fn=30);
            translate([-flap_hole_radius * 1.25, 0])
            circle(r=flap_hole_radius/2, $fn=30);
        }
    }

    if (height > 0) {
        // convexity parameter fixes 'difference()' face polarity in preview mode... somehow
        linear_extrude(height, convexity=2)
            flap_spool_home_indicator_2d();
    } else {
        flap_spool_home_indicator_2d();
    }
}

function flap_spool_pitch_radius(flaps, flap_hole_radius, separation) = 
    flaps * (flap_hole_radius*2 + separation) / (2*PI);

function flap_spool_outer_radius(flaps, flap_hole_radius, separation, outset) = 
    flap_spool_pitch_radius(flaps, flap_hole_radius, separation) + flap_hole_radius + outset;

module spool_retaining_wall(m4_bolt_hole=false) {
    linear_extrude(thickness) {
        difference() {
            square([spool_strut_width, spool_strut_width], center=true);
            spool_strut_tab_holes(clearance=spool_retaining_clearance);
            if (m4_bolt_hole) {
                circle(r=m4_hole_diameter/2, $fn=30);
            }
        }
    }
}
